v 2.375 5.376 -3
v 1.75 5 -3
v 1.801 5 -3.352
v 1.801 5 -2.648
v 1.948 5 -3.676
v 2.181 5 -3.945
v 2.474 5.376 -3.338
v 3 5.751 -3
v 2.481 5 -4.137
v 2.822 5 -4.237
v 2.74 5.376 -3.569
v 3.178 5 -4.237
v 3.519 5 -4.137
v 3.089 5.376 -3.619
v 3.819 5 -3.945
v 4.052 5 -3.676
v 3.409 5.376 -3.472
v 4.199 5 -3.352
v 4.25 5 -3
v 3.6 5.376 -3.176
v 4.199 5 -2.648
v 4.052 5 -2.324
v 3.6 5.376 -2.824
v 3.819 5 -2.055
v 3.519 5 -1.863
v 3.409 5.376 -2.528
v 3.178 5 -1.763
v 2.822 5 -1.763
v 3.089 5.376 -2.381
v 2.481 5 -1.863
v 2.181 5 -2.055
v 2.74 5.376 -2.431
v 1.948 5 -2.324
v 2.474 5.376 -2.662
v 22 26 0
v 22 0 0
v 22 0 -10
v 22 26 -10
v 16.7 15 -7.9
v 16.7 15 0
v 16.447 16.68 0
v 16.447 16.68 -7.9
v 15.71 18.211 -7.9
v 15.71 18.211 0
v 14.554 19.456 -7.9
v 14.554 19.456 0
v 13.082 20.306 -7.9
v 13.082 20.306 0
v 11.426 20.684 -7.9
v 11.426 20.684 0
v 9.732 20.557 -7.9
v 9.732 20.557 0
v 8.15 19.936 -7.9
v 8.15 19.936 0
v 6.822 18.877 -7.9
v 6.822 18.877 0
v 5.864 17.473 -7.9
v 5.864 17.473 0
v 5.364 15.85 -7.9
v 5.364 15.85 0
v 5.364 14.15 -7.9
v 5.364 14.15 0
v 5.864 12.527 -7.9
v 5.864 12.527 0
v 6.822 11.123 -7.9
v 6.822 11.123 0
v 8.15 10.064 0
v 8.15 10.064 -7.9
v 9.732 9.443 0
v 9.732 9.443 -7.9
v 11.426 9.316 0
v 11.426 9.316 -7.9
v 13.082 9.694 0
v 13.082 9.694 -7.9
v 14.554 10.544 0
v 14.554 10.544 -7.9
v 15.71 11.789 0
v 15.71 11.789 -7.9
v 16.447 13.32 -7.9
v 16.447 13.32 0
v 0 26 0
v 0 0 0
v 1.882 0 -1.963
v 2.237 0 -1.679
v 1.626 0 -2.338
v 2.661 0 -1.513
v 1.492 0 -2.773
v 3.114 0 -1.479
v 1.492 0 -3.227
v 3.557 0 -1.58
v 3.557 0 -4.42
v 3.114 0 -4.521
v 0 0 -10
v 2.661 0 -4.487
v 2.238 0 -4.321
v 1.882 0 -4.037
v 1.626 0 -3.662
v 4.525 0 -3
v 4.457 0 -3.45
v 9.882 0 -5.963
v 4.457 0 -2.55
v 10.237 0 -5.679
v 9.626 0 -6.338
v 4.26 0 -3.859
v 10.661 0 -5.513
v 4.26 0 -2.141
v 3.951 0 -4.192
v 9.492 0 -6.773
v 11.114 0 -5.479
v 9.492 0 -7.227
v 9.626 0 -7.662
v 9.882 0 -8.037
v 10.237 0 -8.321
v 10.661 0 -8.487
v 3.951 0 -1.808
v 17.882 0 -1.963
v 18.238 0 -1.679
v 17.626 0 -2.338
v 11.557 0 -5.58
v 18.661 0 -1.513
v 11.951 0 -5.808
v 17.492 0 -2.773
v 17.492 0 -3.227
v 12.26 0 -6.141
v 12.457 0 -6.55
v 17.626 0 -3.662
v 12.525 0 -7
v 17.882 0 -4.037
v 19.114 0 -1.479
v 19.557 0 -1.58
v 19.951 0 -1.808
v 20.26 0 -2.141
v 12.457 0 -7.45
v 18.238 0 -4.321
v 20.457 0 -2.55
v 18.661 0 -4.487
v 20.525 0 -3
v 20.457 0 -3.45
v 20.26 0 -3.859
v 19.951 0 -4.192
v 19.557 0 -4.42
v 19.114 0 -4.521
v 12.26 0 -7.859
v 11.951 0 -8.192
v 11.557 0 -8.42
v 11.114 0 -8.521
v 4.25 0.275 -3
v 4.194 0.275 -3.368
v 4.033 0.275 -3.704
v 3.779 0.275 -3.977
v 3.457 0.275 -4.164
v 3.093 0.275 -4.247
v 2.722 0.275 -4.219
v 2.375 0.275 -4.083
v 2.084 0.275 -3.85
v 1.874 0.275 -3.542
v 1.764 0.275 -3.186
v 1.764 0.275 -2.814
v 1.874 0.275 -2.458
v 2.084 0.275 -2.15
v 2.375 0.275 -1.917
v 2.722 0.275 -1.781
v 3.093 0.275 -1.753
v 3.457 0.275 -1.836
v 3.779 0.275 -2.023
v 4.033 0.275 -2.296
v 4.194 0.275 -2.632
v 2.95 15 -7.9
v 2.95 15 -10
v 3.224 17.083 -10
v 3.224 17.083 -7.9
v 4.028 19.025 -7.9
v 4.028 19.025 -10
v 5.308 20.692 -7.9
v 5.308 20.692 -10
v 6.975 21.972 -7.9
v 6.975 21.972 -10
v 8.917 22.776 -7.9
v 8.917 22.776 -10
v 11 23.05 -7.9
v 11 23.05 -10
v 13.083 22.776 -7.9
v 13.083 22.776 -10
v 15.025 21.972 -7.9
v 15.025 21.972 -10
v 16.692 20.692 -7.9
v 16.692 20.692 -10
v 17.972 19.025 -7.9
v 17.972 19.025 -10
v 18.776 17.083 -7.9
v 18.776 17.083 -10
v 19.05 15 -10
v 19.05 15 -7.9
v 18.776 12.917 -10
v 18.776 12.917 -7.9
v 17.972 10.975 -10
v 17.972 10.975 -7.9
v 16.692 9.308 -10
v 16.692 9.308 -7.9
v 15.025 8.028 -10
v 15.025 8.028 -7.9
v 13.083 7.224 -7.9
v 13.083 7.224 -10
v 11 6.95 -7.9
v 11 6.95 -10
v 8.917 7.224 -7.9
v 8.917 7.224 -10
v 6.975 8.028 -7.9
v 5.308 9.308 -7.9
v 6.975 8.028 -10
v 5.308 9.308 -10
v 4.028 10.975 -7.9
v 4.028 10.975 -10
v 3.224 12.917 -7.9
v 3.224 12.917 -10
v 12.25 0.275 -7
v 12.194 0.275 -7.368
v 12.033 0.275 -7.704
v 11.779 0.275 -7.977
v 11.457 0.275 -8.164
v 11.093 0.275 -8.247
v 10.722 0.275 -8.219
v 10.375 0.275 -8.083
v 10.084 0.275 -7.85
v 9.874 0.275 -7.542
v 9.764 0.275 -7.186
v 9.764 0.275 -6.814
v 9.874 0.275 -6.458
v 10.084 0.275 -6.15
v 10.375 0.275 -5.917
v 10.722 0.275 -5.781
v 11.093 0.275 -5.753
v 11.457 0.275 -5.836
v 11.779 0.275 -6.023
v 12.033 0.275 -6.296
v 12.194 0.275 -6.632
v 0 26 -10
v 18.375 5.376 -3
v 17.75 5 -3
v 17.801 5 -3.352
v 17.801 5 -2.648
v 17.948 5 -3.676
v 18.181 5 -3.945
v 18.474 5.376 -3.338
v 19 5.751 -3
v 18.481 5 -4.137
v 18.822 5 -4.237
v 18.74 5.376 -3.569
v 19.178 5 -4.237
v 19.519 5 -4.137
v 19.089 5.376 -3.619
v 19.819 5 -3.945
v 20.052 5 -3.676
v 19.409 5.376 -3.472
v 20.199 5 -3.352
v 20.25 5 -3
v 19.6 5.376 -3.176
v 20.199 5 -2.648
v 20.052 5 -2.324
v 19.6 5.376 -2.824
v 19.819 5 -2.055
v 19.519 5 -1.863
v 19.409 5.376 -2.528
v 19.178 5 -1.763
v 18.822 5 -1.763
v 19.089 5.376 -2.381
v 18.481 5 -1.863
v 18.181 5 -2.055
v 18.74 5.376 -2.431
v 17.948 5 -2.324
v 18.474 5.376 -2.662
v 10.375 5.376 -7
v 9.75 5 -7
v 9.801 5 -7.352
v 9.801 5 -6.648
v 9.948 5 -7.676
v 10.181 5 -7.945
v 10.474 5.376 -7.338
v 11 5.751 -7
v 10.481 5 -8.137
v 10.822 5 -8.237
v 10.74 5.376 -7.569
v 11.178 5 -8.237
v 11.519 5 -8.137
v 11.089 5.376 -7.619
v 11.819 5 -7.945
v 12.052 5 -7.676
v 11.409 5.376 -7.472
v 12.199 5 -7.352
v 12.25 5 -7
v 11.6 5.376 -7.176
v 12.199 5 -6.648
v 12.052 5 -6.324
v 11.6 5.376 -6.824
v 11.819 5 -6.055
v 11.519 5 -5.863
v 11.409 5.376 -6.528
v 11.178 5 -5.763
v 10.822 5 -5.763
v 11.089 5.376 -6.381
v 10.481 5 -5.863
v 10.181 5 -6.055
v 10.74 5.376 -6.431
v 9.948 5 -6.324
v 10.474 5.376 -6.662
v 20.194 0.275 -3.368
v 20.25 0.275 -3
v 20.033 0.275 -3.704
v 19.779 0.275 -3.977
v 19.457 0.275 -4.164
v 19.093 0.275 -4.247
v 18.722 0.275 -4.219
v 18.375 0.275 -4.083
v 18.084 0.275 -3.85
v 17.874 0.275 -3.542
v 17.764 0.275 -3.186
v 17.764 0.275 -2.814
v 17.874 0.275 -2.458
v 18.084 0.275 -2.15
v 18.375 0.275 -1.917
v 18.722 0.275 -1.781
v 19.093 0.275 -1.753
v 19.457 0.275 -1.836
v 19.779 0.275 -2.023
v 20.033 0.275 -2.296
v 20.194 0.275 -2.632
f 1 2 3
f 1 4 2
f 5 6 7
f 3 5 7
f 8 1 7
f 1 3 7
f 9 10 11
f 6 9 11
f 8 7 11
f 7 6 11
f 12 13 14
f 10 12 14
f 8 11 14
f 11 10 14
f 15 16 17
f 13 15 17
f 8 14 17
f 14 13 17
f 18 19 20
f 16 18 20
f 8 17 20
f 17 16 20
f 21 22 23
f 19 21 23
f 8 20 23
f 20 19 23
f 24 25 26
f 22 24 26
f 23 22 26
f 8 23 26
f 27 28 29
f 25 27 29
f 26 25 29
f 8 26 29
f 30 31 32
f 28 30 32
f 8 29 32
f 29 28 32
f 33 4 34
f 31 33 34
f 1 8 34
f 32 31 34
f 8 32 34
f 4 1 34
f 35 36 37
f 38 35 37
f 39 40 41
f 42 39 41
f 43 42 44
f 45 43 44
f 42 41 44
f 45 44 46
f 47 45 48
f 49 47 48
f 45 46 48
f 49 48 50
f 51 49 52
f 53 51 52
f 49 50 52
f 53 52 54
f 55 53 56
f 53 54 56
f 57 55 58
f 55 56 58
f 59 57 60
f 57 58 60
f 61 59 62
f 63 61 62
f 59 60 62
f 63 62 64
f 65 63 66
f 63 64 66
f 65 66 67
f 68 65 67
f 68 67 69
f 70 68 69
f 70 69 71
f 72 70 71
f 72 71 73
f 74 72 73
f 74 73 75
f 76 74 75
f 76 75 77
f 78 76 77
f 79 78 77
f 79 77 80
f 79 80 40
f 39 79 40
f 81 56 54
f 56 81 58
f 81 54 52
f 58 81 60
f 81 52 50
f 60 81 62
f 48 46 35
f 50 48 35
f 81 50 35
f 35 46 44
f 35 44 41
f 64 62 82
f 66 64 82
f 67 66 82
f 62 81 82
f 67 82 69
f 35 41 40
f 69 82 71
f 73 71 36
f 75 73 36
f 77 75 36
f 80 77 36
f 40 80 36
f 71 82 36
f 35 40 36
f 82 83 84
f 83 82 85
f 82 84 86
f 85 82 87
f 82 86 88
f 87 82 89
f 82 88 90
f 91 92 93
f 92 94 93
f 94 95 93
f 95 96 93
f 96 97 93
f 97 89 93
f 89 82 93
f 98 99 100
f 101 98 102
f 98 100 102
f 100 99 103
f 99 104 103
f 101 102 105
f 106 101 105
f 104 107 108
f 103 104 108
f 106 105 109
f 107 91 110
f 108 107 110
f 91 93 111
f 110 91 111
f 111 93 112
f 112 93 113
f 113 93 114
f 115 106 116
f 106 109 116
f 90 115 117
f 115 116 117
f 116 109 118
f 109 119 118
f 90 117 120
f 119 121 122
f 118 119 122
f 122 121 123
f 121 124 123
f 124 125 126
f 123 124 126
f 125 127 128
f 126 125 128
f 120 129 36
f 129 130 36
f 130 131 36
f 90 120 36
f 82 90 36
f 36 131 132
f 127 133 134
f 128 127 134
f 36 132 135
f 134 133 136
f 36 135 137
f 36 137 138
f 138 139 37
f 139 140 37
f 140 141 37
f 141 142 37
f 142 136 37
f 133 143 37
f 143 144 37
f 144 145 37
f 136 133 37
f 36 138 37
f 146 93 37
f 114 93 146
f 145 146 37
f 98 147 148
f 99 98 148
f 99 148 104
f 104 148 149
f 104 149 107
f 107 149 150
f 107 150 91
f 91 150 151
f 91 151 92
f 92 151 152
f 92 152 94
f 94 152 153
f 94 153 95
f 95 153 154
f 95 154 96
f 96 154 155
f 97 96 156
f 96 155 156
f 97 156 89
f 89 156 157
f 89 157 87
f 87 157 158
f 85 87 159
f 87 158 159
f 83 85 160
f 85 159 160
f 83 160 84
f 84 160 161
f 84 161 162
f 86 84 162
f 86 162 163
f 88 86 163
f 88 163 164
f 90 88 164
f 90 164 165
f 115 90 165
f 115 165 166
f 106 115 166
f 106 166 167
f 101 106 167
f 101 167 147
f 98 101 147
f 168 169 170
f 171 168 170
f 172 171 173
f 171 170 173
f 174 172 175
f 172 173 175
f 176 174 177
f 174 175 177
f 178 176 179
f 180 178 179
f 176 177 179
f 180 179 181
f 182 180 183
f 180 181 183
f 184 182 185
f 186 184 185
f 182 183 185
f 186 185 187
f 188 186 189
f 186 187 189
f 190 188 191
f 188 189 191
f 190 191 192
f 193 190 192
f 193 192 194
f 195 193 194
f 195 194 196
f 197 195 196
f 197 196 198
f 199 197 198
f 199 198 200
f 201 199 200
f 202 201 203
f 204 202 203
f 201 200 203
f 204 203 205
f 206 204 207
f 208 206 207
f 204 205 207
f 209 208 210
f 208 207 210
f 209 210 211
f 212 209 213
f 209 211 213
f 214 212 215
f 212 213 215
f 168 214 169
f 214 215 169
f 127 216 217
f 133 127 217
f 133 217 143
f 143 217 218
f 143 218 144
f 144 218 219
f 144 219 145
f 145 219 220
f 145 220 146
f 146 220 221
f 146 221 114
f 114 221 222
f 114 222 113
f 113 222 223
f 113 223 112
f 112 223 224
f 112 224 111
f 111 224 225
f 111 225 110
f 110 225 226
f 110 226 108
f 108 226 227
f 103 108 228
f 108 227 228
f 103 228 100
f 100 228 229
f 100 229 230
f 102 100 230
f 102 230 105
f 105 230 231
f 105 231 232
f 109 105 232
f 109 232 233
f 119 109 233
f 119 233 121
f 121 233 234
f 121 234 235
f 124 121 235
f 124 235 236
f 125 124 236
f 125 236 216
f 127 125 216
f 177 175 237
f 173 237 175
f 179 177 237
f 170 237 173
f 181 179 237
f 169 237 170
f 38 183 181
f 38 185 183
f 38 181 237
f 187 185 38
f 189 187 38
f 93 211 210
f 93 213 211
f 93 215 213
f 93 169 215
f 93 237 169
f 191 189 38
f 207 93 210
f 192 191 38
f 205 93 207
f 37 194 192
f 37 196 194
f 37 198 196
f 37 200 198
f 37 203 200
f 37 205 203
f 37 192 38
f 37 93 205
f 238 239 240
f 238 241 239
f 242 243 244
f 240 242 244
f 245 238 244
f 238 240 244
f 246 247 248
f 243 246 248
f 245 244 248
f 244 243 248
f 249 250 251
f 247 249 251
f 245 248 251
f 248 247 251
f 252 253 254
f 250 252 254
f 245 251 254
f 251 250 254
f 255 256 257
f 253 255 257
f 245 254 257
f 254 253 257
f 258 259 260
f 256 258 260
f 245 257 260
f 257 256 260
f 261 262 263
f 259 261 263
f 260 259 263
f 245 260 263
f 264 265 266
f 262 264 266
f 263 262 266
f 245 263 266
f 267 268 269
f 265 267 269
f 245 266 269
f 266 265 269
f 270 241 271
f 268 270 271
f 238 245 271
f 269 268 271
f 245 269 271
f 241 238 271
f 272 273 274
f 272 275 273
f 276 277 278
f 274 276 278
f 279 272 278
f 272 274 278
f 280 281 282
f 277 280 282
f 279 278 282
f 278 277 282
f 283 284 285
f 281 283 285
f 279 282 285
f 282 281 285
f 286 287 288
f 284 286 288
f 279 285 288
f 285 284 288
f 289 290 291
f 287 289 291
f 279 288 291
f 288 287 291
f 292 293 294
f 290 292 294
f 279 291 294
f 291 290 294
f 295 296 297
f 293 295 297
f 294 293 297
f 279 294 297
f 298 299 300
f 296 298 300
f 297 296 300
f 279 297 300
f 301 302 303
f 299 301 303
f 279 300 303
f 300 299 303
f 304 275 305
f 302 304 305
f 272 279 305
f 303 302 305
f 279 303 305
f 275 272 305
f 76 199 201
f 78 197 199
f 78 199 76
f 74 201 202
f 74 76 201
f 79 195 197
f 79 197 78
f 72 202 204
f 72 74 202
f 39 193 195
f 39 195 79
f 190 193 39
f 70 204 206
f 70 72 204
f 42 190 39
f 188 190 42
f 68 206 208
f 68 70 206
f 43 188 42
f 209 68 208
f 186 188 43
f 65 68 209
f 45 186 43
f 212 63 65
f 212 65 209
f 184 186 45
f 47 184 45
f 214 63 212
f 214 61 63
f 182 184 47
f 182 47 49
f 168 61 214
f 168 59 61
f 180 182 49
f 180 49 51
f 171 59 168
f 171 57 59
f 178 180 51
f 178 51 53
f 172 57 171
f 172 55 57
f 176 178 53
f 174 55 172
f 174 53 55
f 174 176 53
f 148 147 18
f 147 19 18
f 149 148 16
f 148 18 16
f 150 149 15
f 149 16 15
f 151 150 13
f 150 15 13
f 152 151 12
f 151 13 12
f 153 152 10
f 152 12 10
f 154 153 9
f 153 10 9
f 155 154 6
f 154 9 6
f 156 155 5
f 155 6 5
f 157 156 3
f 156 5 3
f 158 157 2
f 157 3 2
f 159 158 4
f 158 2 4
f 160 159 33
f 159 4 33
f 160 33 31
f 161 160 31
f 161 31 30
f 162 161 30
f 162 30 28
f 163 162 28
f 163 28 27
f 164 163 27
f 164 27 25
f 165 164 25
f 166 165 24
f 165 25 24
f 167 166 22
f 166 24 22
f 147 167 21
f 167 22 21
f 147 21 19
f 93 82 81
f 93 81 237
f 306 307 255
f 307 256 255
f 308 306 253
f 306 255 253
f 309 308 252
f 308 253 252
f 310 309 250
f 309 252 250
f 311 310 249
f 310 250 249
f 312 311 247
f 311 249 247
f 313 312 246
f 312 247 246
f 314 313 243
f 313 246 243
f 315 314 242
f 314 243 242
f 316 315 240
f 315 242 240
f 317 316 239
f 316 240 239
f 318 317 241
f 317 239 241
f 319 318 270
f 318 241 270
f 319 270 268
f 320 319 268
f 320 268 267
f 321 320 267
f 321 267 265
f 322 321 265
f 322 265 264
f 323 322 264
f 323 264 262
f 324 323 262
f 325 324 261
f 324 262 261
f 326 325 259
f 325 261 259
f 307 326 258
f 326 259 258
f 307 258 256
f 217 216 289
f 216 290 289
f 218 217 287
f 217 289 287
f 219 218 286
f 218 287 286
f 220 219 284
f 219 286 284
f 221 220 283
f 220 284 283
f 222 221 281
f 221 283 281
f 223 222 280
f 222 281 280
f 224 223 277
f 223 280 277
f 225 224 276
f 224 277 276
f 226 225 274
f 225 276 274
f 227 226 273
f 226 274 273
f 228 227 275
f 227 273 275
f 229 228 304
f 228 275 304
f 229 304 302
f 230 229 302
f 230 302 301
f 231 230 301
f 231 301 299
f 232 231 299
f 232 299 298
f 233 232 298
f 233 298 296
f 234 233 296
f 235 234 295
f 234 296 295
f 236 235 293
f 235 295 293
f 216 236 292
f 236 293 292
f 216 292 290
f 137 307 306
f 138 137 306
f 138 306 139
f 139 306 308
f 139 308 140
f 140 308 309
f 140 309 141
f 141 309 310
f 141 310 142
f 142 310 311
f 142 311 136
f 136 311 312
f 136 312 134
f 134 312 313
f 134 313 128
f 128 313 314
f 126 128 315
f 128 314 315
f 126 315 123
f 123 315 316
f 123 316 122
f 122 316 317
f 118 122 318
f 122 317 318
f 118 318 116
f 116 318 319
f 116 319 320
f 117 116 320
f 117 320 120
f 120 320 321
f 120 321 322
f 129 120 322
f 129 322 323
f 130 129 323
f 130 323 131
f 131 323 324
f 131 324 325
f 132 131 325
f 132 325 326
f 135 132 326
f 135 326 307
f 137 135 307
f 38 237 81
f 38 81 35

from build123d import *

# Parameters (mm, degrees)
SKETCH1_W                       = 22
SKETCH1_H                       = 10
BOSS_EXTRUDE1_DEPTH             = 26
SKETCH7_R                       = 5.7
CUT_EXTRUDE1_DEPTH              = 11
SKETCH9_R                       = 8.05
CUT_EXTRUDE3_DEPTH              = 2.1
M3X0_5_TAPPED_HOLE1_D           = 2.5
M3X0_5_TAPPED_HOLE1_DEPTH       = 5
M3X0_5_TAPPED_HOLE1_CSINK_D     = 3.05
M3X0_5_TAPPED_HOLE1_CSINK_ANGLE = 90
M3X0_5_TAPPED_HOLE1_TIP         = 0.751075774


with BuildPart() as part:
    # Sketch1 → Boss-Extrude1 (new body)
    with BuildSketch(Plane(origin=(0, 0, 0), x_dir=(1, 0, 0), z_dir=(0, 1, 0))):
        with Locations((11, 5)):
            Rectangle(SKETCH1_W, SKETCH1_H)
    extrude(amount=BOSS_EXTRUDE1_DEPTH)

    # Sketch7 → Cut-Extrude1 (cut, through all)
    with BuildSketch(Plane.XY):
        with Locations((11, 15)):
            Circle(SKETCH7_R)
    extrude(amount=-CUT_EXTRUDE1_DEPTH, mode=Mode.SUBTRACT)

    # Sketch9 → Cut-Extrude3 (cut)
    with BuildSketch(Plane(origin=(0, 0, -10), x_dir=(-1, 0, 0), z_dir=(0, 0, -1))):
        with Locations((-11, 15)):
            Circle(SKETCH9_R)
    extrude(amount=-CUT_EXTRUDE3_DEPTH, mode=Mode.SUBTRACT)

    # M3x0.5 Tapped Hole1
    with Locations(Plane(origin=(0, 0, 0), x_dir=(-1, 0, 0), z_dir=(0, -1, 0))):
        with Locations((-3, 3), (-19, 3), (-11, 7)):
            CounterSinkHole(M3X0_5_TAPPED_HOLE1_D / 2, M3X0_5_TAPPED_HOLE1_CSINK_D / 2, depth=M3X0_5_TAPPED_HOLE1_DEPTH, counter_sink_angle=M3X0_5_TAPPED_HOLE1_CSINK_ANGLE)
            with Locations((0, 0, -(M3X0_5_TAPPED_HOLE1_DEPTH + M3X0_5_TAPPED_HOLE1_TIP / 2))):  # 118° drill point
                Cone(0, M3X0_5_TAPPED_HOLE1_D / 2, M3X0_5_TAPPED_HOLE1_TIP, mode=Mode.SUBTRACT)


solid = part.part
